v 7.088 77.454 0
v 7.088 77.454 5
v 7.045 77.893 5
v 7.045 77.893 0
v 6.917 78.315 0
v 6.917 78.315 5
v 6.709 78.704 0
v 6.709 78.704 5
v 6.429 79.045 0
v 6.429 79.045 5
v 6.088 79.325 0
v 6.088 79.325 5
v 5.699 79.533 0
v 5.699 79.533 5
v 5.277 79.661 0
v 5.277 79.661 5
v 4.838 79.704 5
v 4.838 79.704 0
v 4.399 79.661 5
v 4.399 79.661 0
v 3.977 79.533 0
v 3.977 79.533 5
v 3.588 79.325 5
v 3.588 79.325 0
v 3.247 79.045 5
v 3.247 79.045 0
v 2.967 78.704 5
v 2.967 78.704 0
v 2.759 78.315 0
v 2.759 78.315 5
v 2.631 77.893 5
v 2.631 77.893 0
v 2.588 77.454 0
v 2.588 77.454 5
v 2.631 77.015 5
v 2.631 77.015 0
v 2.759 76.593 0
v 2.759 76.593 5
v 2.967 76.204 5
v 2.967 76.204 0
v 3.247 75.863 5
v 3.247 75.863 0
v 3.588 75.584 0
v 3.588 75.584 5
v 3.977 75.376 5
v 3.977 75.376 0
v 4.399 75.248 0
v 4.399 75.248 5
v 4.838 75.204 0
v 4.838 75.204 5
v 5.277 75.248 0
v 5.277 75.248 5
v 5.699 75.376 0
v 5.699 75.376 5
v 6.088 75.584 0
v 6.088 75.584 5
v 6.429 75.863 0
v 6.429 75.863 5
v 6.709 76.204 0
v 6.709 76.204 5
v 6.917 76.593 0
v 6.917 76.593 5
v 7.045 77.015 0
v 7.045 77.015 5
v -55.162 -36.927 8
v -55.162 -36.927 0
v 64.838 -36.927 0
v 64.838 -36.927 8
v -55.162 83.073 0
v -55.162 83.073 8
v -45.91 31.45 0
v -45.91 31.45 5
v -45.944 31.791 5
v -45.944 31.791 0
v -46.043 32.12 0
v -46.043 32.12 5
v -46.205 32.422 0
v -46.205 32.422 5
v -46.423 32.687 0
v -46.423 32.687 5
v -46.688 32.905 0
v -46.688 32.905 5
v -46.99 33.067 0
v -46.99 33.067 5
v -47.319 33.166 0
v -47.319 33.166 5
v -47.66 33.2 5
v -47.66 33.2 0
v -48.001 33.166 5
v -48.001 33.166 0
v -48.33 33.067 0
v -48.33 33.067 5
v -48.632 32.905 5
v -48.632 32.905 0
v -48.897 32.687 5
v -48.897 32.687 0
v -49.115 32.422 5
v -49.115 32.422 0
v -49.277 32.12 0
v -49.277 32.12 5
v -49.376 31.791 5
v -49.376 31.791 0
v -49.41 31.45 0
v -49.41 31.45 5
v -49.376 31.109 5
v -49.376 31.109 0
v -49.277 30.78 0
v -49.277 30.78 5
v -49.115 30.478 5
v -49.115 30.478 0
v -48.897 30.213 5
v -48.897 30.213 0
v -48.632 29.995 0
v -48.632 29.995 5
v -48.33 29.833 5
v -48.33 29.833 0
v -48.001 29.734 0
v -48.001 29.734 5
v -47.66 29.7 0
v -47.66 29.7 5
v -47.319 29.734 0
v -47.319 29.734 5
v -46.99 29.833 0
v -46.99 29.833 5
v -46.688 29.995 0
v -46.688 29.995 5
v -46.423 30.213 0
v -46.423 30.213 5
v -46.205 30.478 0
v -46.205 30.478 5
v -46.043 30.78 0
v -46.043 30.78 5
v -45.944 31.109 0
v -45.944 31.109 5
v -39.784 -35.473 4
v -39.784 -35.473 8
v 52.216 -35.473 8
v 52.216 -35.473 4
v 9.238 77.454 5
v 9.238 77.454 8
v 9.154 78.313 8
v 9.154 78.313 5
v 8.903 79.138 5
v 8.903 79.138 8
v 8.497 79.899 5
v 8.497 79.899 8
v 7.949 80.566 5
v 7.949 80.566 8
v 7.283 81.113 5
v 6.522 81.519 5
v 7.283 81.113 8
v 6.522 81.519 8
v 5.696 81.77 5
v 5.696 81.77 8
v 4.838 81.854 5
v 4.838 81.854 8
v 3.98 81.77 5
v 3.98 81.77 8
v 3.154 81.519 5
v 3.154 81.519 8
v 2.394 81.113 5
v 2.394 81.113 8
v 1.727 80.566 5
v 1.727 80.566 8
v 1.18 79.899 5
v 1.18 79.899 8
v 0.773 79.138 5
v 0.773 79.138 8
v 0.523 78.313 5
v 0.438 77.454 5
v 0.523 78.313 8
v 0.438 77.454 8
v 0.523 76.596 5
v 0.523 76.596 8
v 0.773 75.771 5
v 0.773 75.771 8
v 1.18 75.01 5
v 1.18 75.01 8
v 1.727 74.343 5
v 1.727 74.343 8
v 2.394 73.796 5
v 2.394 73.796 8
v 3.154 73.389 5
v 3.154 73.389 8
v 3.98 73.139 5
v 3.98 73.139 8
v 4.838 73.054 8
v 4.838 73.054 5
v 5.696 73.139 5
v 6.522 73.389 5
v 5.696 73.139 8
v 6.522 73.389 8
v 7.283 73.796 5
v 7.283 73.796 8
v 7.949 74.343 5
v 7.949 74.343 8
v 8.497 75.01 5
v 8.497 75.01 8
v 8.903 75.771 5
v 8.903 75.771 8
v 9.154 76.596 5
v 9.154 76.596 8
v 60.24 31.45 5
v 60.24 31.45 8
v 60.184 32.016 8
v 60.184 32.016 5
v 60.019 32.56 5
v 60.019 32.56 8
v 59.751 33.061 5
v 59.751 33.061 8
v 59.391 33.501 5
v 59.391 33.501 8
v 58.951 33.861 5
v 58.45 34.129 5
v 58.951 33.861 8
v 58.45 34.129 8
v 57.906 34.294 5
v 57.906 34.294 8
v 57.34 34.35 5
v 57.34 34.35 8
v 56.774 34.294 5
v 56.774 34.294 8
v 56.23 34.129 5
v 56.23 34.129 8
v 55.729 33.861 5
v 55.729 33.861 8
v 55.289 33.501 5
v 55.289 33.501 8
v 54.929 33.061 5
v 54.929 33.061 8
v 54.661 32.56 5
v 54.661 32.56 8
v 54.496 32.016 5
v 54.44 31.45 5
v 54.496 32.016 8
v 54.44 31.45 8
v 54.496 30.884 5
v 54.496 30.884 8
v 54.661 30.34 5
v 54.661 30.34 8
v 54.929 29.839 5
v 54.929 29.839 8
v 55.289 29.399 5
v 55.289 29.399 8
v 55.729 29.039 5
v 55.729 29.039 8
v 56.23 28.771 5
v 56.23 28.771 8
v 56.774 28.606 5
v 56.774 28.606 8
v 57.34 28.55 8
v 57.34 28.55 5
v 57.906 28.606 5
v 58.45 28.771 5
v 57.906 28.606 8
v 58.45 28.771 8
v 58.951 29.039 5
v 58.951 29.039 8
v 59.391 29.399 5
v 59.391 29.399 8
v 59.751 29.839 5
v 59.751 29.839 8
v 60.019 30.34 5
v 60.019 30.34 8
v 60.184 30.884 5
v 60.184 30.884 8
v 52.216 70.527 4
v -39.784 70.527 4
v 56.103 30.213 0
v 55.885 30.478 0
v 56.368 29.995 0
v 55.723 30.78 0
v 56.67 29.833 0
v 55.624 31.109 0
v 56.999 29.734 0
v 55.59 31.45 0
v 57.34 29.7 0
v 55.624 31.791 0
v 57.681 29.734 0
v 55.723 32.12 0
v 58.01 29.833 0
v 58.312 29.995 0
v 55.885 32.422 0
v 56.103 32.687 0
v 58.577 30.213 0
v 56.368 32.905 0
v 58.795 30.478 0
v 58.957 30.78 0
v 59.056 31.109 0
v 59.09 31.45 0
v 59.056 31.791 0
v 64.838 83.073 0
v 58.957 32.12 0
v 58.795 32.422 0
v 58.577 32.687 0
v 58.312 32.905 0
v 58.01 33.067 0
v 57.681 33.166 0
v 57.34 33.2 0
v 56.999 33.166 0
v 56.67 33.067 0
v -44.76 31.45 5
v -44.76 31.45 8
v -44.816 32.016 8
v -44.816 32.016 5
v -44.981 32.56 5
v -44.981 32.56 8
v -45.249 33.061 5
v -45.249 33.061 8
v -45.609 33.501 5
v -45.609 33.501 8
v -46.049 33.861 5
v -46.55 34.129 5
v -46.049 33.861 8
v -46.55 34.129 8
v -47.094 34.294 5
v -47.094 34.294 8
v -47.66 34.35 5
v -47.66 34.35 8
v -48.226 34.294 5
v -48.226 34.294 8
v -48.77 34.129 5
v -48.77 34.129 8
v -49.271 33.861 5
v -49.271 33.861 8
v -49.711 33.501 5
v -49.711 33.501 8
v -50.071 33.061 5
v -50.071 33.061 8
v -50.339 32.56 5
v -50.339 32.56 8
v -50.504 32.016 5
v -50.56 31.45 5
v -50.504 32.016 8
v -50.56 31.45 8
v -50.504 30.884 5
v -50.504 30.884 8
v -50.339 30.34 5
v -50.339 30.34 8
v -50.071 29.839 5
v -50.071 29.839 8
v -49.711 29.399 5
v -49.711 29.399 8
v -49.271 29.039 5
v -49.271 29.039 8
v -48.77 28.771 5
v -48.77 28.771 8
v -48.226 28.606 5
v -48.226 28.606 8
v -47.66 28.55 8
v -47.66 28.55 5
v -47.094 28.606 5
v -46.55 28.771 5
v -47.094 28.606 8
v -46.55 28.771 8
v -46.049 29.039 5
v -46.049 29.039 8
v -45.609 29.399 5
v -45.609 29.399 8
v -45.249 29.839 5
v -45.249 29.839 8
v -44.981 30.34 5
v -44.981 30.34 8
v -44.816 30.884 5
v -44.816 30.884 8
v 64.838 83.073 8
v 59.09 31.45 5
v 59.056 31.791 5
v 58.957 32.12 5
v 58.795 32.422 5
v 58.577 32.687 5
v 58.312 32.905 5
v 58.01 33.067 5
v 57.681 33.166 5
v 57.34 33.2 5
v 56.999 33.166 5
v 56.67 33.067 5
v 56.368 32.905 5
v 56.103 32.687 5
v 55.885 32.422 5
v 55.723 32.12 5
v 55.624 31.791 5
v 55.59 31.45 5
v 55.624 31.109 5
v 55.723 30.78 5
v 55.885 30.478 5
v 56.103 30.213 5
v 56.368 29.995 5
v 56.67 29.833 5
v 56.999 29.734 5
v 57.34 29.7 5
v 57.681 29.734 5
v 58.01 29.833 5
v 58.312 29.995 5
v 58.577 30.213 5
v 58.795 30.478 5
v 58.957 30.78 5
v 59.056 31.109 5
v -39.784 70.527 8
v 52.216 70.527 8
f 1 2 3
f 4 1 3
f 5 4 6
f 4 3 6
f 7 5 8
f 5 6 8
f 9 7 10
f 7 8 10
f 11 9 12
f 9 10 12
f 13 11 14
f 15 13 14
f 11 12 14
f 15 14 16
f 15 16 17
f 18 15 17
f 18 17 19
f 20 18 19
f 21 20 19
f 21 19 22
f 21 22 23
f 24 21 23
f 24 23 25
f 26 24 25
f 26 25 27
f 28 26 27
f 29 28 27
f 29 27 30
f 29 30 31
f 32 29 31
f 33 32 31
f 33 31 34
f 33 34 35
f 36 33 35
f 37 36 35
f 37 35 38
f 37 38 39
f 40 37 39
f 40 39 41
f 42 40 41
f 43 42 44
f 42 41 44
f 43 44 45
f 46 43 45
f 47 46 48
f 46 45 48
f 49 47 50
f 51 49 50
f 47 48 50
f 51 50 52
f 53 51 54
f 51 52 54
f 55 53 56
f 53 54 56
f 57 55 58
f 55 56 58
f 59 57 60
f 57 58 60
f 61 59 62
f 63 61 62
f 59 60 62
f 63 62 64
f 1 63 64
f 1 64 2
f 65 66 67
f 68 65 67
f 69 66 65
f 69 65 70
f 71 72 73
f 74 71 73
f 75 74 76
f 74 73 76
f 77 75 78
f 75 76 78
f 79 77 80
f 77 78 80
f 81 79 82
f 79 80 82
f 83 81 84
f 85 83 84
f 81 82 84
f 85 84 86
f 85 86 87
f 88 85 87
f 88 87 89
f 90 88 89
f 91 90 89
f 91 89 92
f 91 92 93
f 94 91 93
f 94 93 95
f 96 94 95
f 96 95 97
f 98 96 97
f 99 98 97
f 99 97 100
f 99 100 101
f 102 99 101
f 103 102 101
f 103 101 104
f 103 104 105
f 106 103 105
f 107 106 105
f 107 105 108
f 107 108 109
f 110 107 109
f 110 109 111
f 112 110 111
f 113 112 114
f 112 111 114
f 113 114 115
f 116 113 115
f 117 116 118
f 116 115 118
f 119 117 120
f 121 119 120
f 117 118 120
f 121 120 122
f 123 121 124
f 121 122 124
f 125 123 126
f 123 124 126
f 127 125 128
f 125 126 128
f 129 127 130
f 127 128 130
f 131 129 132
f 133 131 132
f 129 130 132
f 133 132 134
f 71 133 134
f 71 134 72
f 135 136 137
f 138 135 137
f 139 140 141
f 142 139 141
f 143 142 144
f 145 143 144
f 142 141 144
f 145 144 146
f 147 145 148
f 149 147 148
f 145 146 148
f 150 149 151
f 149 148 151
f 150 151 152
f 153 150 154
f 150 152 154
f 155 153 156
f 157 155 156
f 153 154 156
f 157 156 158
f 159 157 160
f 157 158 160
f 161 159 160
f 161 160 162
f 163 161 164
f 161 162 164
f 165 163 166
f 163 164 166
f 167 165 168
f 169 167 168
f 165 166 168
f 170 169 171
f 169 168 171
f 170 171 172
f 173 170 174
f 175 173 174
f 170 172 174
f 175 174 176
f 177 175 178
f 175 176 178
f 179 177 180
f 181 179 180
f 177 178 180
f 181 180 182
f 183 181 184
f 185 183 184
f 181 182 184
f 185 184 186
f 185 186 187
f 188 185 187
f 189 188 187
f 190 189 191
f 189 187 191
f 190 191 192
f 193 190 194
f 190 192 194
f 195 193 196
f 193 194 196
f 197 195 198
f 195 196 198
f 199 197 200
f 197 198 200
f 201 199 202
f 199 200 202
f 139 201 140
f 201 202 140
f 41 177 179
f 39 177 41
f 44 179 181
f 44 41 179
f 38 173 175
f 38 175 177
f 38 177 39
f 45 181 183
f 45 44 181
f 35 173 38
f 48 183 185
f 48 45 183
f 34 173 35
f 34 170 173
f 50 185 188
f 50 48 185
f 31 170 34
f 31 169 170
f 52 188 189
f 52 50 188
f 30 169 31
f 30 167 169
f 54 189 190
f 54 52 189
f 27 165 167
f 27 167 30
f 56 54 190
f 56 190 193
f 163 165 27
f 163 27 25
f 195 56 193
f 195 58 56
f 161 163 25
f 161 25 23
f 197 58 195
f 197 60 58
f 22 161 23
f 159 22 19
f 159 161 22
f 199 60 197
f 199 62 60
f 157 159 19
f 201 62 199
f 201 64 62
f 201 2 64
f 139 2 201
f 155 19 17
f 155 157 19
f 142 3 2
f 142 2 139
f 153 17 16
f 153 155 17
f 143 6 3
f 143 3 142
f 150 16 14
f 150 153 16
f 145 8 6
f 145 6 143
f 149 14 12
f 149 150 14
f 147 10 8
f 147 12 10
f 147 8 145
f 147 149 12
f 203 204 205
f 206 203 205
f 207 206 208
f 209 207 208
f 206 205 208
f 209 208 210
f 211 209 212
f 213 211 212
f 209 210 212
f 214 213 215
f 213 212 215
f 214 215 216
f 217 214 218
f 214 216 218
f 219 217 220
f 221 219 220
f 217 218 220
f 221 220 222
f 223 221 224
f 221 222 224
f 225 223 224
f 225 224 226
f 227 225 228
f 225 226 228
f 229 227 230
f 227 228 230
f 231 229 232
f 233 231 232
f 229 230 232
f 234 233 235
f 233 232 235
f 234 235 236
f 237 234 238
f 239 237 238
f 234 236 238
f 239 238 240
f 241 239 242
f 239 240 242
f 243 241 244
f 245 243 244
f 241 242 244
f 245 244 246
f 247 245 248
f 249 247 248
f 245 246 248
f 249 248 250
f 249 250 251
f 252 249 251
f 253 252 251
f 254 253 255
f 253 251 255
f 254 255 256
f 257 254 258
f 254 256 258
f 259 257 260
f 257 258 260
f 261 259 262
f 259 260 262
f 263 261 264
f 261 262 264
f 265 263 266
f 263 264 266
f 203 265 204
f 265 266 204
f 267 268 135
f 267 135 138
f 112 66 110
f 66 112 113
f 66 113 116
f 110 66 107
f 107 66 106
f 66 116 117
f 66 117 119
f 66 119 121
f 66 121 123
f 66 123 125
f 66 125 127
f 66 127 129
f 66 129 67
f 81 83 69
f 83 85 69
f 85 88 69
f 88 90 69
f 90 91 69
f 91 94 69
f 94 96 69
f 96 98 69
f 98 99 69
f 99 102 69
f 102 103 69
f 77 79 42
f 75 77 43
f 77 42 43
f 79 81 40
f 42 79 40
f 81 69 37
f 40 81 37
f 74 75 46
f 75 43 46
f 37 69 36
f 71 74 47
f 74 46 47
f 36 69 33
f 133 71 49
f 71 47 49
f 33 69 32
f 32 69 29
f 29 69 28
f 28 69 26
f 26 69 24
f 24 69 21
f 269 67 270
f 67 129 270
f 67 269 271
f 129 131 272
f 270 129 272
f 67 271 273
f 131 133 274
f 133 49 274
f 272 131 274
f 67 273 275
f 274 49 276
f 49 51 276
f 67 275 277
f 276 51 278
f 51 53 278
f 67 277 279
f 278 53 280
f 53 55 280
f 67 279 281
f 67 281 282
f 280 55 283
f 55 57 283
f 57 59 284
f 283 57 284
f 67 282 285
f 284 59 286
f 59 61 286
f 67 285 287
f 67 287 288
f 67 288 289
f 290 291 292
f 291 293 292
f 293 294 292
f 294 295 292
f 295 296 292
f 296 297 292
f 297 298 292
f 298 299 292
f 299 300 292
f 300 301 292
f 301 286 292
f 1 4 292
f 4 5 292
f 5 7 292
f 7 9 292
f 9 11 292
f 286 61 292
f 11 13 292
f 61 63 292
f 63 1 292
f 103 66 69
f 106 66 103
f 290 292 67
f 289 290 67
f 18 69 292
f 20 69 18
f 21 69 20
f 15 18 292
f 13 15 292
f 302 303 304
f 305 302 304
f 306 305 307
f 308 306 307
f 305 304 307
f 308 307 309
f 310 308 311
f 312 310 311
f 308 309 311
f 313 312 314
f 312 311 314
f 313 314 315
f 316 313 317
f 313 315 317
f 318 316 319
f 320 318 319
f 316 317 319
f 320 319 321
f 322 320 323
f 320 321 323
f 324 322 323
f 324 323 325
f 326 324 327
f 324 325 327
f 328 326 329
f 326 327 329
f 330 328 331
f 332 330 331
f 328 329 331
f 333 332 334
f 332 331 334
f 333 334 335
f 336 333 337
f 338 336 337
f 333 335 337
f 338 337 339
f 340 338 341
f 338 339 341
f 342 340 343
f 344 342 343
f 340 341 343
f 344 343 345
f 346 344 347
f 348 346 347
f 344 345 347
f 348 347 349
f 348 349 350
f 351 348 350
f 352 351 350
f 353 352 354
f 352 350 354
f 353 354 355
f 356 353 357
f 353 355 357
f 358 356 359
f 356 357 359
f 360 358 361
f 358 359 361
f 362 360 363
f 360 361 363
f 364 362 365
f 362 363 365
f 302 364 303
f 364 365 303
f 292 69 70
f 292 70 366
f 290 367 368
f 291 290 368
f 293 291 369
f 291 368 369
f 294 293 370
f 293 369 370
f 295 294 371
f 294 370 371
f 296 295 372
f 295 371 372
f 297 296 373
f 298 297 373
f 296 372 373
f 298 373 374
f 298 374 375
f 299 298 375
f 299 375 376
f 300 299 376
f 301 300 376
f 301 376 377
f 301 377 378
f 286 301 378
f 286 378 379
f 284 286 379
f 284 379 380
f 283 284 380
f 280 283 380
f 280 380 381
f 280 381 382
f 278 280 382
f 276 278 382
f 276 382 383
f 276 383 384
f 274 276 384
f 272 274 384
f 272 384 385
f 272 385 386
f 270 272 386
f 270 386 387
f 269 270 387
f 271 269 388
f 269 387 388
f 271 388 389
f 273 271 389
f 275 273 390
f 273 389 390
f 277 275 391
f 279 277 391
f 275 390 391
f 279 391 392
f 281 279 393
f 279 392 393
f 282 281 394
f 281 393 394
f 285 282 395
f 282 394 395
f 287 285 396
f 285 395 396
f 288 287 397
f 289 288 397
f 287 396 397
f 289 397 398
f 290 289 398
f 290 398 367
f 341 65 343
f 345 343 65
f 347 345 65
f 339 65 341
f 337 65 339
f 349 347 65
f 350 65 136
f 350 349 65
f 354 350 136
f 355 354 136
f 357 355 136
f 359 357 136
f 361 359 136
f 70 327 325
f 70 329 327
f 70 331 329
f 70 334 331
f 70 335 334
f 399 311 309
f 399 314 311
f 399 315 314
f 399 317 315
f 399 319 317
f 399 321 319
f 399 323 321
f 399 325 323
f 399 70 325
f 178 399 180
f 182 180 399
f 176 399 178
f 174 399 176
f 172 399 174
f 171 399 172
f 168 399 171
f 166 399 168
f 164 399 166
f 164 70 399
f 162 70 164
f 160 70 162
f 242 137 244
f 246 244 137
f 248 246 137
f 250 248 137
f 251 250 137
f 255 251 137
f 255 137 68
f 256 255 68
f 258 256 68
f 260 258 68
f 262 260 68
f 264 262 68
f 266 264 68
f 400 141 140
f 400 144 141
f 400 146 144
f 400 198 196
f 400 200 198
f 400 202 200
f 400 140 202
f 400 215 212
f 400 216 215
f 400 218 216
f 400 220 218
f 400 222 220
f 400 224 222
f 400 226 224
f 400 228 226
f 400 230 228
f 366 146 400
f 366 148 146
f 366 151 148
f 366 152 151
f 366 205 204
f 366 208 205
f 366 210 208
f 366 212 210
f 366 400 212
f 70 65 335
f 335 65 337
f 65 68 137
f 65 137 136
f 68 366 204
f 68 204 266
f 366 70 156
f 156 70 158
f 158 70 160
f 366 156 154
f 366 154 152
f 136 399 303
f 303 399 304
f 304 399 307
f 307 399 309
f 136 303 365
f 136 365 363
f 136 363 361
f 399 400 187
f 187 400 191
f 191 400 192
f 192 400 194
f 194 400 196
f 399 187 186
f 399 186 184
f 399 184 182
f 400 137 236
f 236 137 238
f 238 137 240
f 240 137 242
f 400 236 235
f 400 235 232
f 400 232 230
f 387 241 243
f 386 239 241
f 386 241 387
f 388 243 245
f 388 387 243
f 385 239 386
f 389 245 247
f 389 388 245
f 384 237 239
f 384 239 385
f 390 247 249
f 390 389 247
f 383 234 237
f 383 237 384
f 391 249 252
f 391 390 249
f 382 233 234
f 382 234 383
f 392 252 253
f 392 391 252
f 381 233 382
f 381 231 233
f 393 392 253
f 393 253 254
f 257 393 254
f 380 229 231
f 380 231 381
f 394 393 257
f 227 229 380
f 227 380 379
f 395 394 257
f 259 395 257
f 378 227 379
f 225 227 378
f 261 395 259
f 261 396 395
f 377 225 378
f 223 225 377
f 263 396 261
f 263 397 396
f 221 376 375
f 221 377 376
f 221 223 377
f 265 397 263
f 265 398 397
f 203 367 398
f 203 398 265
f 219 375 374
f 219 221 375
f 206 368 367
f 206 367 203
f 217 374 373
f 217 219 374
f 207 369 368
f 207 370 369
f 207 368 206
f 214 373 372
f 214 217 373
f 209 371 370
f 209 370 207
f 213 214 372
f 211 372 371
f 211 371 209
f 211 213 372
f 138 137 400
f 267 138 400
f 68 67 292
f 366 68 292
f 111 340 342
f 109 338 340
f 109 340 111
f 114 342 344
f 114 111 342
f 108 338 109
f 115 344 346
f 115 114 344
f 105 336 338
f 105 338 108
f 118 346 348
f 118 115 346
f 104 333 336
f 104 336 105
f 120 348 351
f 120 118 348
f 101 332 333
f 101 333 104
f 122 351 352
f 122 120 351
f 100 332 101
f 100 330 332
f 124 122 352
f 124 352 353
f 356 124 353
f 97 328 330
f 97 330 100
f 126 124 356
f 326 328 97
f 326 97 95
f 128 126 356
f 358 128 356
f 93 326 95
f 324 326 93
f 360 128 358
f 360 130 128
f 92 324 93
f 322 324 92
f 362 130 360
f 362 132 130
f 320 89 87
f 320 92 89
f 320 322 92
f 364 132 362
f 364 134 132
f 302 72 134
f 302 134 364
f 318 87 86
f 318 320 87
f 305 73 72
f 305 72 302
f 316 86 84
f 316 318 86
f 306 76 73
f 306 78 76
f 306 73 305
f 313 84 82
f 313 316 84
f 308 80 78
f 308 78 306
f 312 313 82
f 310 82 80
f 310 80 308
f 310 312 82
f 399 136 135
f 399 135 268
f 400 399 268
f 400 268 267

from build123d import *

# Parameters (mm, degrees)
SKETCH_1_W          = 120
SKETCH_1_H          = 120
EXTRUDE_1_DEPTH     = 8
SKETCH_3_R          = 2.25
CUT_EXTRUDE_1_DEPTH = 8
SKETCH_4_R          = 4.4
CUT_EXTRUDE_2_DEPTH = 3
SKETCH_5_R          = 1.75
CUT_EXTRUDE_3_DEPTH = 8
SKETCH_6_R          = 2.9
CUT_EXTRUDE_4_DEPTH = 3
SKETCH_7_R          = 1.75
CUT_EXTRUDE_5_DEPTH = 8
SKETCH_8_R          = 2.9
CUT_EXTRUDE_6_DEPTH = 3
SKETCH_9_W          = 92
SKETCH_9_H          = 106
CUT_EXTRUDE_7_DEPTH = 4


with BuildPart() as part:
    # 草图1 → 凸台-拉伸1 (new body)
    with BuildSketch(Plane.XY):
        with Locations((4.838054616, 23.07265118)):
            Rectangle(SKETCH_1_W, SKETCH_1_H)
    extrude(amount=EXTRUDE_1_DEPTH)

    # 草图3 → 切除-拉伸1 (cut)
    with BuildSketch(Plane.XY.offset(8)):
        with Locations((4.838054616, 77.454324244)):
            Circle(SKETCH_3_R)
    extrude(amount=-CUT_EXTRUDE_1_DEPTH, mode=Mode.SUBTRACT)

    # 草图4 → 切除-拉伸2 (cut)
    with BuildSketch(Plane.XY.offset(8)):
        with Locations((4.838054616, 77.454324244)):
            Circle(SKETCH_4_R)
    extrude(amount=-CUT_EXTRUDE_2_DEPTH, mode=Mode.SUBTRACT)

    # 草图5 → 切除-拉伸3 (cut)
    with BuildSketch(Plane.XY.offset(8)):
        with Locations((57.34, 31.45)):
            Circle(SKETCH_5_R)
    extrude(amount=-CUT_EXTRUDE_3_DEPTH, mode=Mode.SUBTRACT)

    # 草图6 → 切除-拉伸4 (cut)
    with BuildSketch(Plane.XY.offset(8)):
        with Locations((57.34, 31.45)):
            Circle(SKETCH_6_R)
    extrude(amount=-CUT_EXTRUDE_4_DEPTH, mode=Mode.SUBTRACT)

    # 草图7 → 切除-拉伸5 (cut)
    with BuildSketch(Plane.XY.offset(8)):
        with Locations((-47.66, 31.45)):
            Circle(SKETCH_7_R)
    extrude(amount=-CUT_EXTRUDE_5_DEPTH, mode=Mode.SUBTRACT)

    # 草图8 → 切除-拉伸6 (cut)
    with BuildSketch(Plane.XY.offset(8)):
        with Locations((-47.66, 31.45)):
            Circle(SKETCH_8_R)
    extrude(amount=-CUT_EXTRUDE_6_DEPTH, mode=Mode.SUBTRACT)

    # 草图9 → 切除-拉伸7 (cut)
    with BuildSketch(Plane.XY.offset(8)):
        with Locations((6.215593236, 17.526521265)):
            Rectangle(SKETCH_9_W, SKETCH_9_H)
    extrude(amount=-CUT_EXTRUDE_7_DEPTH, mode=Mode.SUBTRACT)


solid = part.part
